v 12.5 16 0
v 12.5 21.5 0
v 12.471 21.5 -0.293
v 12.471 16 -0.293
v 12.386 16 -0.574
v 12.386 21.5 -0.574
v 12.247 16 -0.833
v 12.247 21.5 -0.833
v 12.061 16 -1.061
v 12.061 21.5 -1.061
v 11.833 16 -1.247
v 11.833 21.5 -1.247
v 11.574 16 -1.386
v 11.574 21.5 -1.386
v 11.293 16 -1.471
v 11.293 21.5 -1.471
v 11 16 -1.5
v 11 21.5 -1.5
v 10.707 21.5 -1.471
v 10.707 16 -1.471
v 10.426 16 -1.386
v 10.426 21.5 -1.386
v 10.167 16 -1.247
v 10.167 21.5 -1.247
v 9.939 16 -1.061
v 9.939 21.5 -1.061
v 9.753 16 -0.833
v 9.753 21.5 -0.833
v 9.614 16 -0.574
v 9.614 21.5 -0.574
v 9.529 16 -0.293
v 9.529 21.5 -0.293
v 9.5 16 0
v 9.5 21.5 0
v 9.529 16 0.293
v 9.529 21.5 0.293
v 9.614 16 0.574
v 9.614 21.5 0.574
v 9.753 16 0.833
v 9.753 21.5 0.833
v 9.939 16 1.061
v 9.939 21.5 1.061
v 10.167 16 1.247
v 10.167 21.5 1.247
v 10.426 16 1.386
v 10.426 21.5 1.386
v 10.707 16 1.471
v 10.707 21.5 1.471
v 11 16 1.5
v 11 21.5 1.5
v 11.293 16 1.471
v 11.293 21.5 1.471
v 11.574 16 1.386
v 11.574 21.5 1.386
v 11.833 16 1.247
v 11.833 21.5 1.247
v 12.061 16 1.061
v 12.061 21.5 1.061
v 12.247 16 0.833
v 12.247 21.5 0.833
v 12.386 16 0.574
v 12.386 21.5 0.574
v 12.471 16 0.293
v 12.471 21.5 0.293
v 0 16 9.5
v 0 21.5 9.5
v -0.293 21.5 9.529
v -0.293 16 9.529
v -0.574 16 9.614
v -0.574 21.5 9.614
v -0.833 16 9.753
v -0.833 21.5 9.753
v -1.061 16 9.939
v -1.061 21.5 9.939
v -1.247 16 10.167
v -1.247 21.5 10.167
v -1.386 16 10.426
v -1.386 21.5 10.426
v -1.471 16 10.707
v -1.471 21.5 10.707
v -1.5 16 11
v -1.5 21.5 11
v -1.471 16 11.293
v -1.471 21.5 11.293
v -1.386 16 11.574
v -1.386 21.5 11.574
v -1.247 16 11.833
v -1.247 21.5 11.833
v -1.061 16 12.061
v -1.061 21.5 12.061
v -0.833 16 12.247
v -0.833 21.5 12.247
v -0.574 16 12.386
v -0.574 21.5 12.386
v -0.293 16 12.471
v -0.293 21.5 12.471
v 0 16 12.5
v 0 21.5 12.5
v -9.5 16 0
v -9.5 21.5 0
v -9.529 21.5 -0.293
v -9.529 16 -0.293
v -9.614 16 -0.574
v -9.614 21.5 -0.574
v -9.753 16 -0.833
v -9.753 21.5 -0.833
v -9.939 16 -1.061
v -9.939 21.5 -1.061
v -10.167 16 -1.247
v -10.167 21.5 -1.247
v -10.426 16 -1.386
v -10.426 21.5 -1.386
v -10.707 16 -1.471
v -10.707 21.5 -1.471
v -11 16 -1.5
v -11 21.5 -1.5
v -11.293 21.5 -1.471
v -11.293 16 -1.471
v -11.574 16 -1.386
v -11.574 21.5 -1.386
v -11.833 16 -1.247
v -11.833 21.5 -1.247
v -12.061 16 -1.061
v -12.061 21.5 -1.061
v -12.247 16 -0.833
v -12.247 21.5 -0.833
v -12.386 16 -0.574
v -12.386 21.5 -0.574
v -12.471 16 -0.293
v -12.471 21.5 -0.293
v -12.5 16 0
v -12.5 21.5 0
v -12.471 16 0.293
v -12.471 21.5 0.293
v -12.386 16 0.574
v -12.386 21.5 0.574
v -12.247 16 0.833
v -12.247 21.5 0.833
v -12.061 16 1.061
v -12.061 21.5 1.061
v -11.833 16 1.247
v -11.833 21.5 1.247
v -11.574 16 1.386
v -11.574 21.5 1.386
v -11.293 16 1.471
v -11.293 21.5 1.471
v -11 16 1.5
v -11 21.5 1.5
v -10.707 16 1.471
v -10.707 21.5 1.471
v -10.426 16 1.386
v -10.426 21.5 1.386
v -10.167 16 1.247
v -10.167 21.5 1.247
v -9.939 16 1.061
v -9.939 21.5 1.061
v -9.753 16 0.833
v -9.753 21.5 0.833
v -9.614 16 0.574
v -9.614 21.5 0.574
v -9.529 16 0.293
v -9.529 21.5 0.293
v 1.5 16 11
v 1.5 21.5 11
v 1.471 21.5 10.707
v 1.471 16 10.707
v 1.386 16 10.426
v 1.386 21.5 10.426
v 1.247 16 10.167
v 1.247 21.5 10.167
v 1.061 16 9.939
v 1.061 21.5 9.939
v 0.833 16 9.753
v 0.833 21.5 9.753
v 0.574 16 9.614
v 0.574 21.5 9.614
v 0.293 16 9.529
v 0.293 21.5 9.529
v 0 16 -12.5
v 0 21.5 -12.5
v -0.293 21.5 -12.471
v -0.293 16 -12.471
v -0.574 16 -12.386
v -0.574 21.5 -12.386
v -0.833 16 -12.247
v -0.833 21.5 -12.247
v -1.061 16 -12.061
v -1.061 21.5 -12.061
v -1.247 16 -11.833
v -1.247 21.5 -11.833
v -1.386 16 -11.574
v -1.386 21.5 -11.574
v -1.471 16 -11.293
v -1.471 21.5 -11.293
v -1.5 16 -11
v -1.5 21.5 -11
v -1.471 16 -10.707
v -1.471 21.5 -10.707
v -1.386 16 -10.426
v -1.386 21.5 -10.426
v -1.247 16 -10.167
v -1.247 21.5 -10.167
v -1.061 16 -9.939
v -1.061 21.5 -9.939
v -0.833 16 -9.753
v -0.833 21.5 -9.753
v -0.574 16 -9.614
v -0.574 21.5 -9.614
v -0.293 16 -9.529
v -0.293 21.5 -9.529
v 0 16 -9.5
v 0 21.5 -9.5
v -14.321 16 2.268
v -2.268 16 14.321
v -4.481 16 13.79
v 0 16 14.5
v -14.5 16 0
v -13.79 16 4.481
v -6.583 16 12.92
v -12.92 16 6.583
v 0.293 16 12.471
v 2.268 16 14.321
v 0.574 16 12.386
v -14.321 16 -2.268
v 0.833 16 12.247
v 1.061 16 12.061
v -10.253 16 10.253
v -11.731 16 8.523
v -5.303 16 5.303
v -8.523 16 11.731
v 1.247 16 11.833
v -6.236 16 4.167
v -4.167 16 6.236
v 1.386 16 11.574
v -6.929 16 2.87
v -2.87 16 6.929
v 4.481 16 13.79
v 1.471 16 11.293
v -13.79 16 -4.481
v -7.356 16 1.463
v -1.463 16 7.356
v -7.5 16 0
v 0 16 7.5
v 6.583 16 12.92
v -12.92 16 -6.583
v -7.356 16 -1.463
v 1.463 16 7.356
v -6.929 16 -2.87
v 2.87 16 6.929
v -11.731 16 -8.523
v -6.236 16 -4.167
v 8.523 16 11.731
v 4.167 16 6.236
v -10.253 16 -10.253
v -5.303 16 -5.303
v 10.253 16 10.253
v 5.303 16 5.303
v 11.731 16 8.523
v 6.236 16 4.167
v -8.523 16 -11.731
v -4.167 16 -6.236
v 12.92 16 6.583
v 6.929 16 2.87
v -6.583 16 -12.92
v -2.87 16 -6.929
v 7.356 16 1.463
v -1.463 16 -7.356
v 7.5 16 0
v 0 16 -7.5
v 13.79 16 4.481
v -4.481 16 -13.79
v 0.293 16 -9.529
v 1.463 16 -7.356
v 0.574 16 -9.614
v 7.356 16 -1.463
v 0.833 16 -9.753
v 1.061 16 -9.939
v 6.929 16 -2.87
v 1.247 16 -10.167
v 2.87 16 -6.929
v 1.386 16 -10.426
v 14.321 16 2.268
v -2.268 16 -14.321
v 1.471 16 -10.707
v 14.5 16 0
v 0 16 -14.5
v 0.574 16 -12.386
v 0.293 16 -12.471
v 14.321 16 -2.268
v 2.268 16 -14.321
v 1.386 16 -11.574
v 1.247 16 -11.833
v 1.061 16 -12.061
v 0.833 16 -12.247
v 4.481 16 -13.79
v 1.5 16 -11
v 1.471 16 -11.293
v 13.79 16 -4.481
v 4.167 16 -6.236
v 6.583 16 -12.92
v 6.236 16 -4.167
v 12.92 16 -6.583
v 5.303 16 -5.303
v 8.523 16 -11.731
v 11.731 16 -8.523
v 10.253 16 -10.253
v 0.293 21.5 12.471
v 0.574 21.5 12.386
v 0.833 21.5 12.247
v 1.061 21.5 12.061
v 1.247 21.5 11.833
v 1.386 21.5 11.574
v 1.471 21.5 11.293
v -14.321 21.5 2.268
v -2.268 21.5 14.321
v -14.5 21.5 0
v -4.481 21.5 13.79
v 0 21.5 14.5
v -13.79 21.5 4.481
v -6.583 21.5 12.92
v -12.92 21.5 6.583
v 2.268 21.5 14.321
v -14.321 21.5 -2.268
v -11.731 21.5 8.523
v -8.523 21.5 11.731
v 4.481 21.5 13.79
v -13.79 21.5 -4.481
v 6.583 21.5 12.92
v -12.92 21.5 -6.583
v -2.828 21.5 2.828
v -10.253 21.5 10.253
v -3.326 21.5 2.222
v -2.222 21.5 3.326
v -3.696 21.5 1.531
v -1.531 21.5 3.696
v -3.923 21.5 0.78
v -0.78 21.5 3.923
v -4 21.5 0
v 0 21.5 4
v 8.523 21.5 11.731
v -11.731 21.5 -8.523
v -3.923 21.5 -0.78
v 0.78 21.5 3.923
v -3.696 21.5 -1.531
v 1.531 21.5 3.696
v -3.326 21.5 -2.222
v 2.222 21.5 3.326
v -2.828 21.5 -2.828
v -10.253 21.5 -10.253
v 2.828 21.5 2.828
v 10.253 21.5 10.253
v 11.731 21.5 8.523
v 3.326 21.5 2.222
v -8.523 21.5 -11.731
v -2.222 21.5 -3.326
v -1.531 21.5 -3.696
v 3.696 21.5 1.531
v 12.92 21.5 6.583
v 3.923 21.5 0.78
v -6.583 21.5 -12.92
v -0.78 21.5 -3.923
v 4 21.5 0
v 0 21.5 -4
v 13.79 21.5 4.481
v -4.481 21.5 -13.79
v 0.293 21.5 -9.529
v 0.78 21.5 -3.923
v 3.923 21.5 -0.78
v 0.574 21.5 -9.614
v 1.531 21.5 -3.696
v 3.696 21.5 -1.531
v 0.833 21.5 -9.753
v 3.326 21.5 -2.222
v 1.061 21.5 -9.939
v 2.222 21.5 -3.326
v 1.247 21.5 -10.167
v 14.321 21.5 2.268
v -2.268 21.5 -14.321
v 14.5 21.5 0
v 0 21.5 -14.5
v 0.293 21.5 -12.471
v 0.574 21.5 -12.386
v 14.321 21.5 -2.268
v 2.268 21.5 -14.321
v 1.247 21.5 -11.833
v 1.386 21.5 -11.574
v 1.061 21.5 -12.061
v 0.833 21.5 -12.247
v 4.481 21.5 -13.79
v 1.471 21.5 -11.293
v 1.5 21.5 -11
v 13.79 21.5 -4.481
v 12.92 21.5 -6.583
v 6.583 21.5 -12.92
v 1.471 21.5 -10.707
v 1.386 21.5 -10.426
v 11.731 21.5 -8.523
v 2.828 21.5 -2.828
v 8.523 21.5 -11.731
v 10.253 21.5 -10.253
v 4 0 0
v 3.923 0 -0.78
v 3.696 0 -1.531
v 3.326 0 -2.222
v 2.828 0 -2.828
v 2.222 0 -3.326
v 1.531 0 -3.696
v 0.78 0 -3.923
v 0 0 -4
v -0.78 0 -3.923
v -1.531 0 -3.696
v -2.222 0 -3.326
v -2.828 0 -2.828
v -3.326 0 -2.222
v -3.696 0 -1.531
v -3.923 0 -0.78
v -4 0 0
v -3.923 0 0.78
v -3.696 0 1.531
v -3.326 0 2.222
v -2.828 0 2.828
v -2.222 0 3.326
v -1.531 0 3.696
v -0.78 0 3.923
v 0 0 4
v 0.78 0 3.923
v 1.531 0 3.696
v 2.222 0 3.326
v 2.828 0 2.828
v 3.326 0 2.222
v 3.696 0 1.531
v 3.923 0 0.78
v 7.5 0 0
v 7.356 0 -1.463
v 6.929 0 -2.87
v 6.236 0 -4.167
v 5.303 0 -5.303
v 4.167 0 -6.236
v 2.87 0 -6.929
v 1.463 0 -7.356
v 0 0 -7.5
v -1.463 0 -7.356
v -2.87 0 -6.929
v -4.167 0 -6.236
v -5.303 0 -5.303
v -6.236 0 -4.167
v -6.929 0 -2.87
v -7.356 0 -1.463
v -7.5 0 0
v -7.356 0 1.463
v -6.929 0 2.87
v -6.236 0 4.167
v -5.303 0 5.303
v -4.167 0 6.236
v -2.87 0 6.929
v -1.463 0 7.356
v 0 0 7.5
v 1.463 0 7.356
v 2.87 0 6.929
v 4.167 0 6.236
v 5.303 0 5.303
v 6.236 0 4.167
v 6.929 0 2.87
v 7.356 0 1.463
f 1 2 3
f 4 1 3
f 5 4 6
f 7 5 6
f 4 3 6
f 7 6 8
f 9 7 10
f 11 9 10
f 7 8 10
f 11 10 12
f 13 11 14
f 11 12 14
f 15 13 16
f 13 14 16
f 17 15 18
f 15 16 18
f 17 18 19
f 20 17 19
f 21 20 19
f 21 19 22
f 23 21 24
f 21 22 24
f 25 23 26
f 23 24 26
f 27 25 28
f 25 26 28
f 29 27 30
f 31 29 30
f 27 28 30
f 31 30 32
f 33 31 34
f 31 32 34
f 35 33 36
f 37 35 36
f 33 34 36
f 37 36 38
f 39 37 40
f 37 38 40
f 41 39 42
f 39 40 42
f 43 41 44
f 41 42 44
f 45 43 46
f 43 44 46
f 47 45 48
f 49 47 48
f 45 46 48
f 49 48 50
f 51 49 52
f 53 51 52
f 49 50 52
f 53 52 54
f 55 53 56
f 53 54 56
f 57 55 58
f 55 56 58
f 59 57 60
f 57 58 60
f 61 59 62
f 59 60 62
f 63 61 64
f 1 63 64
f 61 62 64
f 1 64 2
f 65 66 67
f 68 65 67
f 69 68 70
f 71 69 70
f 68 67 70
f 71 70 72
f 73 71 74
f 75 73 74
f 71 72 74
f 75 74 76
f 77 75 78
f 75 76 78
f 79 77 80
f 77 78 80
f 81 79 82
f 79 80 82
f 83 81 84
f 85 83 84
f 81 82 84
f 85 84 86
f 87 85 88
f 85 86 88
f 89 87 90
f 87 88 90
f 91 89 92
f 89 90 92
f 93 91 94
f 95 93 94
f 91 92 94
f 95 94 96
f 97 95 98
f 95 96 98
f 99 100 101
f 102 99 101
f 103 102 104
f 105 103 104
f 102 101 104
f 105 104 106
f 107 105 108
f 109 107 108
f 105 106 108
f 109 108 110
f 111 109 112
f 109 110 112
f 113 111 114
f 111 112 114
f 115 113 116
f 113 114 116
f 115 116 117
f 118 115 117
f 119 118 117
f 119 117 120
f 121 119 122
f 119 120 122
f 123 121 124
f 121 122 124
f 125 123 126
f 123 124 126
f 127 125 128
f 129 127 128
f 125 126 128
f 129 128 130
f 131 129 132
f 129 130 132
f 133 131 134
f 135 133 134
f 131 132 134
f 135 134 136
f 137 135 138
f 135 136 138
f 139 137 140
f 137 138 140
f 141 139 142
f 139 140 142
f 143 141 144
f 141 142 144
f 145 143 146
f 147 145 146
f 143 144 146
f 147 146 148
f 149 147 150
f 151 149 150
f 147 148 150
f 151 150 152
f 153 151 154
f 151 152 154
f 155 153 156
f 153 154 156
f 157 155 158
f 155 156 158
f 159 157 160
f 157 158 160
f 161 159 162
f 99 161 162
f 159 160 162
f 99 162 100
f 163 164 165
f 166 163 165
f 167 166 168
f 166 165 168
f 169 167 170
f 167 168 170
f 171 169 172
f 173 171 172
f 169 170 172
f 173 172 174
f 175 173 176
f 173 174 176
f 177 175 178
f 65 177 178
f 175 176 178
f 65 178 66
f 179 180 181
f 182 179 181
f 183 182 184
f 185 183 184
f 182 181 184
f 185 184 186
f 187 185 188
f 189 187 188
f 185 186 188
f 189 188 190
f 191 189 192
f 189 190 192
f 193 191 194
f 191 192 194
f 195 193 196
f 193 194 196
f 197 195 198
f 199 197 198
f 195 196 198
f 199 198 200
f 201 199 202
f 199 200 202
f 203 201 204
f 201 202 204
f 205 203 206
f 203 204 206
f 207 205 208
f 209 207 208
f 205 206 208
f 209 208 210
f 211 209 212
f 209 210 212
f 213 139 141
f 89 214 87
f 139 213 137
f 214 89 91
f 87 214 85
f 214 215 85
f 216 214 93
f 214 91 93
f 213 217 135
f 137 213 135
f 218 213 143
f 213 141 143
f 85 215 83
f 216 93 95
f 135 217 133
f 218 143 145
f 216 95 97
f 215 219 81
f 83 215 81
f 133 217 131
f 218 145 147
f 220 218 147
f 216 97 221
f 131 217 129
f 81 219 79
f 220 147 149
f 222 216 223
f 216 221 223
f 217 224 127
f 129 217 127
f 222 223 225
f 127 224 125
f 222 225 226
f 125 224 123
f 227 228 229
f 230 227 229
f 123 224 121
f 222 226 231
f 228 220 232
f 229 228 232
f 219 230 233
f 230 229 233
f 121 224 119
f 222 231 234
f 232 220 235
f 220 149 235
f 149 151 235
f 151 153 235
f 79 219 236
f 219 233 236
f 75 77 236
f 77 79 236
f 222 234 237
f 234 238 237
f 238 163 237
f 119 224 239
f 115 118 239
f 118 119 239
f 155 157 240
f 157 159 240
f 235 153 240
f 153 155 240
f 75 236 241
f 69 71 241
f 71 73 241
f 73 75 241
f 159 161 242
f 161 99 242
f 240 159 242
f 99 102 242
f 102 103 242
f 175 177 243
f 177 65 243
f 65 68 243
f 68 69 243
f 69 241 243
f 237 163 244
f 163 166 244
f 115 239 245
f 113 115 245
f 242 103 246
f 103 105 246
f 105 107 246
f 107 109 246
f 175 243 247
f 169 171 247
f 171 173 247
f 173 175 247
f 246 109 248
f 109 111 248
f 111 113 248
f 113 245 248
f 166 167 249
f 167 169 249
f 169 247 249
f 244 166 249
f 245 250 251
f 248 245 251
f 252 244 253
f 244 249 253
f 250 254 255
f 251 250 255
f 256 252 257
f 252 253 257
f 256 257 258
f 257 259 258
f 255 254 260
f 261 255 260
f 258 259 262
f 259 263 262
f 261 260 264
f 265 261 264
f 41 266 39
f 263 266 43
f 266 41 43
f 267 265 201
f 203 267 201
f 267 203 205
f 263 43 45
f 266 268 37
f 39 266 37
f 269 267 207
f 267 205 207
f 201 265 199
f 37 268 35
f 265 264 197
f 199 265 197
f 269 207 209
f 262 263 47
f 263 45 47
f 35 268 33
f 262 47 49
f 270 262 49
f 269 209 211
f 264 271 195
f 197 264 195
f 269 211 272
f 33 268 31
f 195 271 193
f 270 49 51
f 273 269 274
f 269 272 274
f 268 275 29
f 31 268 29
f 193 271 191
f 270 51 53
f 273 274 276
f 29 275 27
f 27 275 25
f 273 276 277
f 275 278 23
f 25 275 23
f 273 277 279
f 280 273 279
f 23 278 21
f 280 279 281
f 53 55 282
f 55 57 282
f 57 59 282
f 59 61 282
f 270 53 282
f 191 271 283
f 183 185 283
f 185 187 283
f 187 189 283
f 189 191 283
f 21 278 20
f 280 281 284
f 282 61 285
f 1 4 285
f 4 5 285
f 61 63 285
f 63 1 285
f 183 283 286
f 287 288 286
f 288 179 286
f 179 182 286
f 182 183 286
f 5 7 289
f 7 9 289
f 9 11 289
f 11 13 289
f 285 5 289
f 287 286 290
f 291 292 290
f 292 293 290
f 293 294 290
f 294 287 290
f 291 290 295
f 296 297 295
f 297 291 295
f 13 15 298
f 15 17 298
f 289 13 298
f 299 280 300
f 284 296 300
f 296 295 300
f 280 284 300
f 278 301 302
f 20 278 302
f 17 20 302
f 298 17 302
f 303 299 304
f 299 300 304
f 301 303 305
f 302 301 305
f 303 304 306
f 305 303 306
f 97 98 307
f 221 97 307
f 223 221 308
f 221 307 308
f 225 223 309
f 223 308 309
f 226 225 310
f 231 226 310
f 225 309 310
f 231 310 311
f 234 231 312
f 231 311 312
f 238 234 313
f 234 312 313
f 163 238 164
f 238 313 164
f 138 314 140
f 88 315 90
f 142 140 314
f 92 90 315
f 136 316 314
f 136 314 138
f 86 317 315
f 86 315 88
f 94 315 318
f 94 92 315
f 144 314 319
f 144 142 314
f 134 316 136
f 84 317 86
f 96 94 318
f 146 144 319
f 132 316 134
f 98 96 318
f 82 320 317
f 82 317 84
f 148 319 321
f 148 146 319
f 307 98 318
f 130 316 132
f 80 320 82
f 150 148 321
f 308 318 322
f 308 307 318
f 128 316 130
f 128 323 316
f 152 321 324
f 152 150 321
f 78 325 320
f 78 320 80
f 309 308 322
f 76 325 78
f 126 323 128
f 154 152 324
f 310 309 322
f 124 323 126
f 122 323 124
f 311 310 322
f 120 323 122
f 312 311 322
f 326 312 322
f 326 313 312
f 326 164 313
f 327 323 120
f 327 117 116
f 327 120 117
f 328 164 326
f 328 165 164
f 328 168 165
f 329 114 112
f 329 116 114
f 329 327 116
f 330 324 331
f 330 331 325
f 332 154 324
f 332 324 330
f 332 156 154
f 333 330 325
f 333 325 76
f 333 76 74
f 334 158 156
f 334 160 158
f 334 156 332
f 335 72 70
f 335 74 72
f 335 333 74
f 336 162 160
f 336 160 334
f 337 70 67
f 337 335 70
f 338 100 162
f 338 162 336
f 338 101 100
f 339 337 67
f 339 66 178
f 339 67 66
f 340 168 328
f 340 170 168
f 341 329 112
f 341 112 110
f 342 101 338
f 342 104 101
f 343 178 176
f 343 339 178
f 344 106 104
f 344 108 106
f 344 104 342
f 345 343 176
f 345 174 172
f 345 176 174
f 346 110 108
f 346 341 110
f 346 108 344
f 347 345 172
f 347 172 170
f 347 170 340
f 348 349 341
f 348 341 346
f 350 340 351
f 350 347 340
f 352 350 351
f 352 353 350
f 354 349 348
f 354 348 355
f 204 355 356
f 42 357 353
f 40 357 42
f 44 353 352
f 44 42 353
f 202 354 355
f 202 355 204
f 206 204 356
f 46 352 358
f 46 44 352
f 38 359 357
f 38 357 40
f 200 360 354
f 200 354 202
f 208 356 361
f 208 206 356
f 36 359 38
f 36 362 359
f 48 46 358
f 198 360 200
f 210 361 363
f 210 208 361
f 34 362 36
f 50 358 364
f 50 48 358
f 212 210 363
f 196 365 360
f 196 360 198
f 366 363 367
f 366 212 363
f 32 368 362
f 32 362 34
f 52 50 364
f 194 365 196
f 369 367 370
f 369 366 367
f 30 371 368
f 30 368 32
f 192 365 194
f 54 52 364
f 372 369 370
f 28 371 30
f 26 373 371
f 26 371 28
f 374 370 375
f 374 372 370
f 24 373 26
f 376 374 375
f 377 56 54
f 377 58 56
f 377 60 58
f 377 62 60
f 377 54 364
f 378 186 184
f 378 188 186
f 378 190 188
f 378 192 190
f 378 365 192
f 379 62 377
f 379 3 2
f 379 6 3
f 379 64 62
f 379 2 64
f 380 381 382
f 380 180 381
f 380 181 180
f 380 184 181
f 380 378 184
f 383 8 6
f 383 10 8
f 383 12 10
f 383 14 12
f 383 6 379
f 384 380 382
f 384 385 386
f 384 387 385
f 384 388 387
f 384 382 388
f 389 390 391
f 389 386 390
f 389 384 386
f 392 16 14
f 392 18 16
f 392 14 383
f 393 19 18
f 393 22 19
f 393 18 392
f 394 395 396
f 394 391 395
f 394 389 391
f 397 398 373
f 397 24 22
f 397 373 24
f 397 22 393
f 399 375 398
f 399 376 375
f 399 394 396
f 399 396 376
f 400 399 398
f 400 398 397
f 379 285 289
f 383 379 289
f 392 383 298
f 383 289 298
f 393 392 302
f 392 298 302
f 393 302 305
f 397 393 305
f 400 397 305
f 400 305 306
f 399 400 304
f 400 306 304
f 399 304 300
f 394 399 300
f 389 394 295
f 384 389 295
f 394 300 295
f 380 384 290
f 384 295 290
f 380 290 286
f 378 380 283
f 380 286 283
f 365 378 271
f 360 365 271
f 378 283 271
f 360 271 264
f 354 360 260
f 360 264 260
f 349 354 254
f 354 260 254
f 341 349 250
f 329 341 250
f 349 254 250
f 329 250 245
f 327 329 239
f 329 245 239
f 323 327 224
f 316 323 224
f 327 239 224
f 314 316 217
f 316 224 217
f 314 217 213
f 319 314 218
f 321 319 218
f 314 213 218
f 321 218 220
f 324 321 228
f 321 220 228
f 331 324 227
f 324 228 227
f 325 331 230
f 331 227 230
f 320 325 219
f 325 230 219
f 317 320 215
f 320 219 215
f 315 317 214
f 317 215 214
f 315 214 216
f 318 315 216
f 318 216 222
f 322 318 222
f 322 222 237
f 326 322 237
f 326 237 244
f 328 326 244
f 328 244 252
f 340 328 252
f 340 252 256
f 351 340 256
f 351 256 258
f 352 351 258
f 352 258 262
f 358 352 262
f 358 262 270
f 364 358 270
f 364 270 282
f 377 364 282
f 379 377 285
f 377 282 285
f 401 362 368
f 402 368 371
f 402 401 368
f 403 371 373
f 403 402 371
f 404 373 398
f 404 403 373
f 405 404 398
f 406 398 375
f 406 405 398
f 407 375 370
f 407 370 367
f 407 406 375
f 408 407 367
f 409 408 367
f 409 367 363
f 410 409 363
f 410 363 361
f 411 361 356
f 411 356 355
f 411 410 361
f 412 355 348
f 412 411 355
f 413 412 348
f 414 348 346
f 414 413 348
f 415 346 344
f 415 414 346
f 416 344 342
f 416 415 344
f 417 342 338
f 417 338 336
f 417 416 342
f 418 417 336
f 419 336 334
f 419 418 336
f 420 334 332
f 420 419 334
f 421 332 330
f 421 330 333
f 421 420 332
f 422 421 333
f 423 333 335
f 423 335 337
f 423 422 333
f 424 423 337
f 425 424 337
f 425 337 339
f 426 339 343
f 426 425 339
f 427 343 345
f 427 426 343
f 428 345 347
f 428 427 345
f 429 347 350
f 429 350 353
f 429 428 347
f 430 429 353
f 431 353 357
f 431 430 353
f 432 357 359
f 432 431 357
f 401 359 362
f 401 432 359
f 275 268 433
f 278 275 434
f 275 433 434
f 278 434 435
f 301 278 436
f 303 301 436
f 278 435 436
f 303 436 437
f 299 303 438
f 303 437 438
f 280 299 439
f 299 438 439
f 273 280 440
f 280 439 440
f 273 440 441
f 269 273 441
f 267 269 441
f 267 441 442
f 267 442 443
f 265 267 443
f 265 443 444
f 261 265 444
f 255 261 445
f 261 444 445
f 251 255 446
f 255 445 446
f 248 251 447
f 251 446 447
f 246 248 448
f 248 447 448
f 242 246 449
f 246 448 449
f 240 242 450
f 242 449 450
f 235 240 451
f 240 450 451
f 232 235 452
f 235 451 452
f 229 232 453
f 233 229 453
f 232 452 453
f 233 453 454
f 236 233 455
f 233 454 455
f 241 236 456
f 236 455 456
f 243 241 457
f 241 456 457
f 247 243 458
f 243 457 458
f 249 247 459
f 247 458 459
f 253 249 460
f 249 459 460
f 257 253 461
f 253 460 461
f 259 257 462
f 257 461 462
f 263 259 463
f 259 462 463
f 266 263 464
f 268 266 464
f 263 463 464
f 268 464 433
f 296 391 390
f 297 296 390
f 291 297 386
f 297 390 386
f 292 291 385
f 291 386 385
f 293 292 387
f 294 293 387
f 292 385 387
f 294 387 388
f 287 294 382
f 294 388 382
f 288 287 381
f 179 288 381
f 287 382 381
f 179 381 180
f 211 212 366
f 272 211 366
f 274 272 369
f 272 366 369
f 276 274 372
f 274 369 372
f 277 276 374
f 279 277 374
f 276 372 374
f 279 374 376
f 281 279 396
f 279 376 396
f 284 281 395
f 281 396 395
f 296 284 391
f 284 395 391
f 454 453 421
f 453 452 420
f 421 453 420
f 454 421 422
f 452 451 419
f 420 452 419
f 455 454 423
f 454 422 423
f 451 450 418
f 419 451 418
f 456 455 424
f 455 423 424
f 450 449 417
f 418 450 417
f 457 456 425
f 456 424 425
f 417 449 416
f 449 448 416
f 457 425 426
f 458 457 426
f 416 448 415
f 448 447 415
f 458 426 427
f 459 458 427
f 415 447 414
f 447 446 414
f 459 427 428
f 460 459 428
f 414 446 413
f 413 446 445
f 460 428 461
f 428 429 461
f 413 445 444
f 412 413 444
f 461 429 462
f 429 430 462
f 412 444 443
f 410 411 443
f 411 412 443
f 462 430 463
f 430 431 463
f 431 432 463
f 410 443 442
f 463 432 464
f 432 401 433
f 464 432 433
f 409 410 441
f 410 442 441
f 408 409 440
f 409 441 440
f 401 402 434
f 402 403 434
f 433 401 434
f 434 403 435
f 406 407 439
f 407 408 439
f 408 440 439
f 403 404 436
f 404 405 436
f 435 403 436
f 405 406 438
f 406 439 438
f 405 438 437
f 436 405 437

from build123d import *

# Parameters (mm, degrees)
SKETCH1_R           = 7.5
SKETCH1_R_2         = 4
BOSS_EXTRUDE1_DEPTH = 16
SKETCH2_R           = 14.5
SKETCH2_R_2         = 7.5
BOSS_EXTRUDE2_DEPTH = 5.5
SKETCH3_R           = 7.5
SKETCH3_R_2         = 4
BOSS_EXTRUDE3_DEPTH = 5.5
SKETCH4_R           = 1.5
CUT_EXTRUDE1_DEPTH  = 5.5


with BuildPart() as part:
    # Sketch1 → Boss-Extrude1 (new body)
    with BuildSketch(Plane(origin=(0, 0, 0), x_dir=(1, 0, 0), z_dir=(0, 1, 0))):
        Circle(SKETCH1_R)
        Circle(SKETCH1_R_2, mode=Mode.SUBTRACT)
    extrude(amount=BOSS_EXTRUDE1_DEPTH)



with BuildPart() as body_2:
    # Sketch2 → Boss-Extrude2 (new body)
    with BuildSketch(Plane(origin=(0, 16, 0), x_dir=(1, 0, 0), z_dir=(0, 1, 0))):
        Circle(SKETCH2_R)
        Circle(SKETCH2_R_2, mode=Mode.SUBTRACT)
    extrude(amount=BOSS_EXTRUDE2_DEPTH)


with BuildPart() as part_1:
    add(part.part)

    add(body_2.part)  # Boss-Extrude3 merges body 2
    # Sketch3 → Boss-Extrude3 (add)
    with BuildSketch(Plane(origin=(0, 16, 0), x_dir=(1, 0, 0), z_dir=(0, 1, 0))):
        Circle(SKETCH3_R)
        Circle(SKETCH3_R_2, mode=Mode.SUBTRACT)
    extrude(amount=BOSS_EXTRUDE3_DEPTH)

    # Sketch4 → Cut-Extrude1 (cut)
    with BuildSketch(Plane(origin=(0, 21.5, 0), x_dir=(1, 0, 0), z_dir=(0, 1, 0))):
        with Locations((11, 0)):
            Circle(SKETCH4_R)
        with BuildLine():
            ThreePointArc((1.5, -11), (1.060660172, -9.939339828), (0, -9.5))
            Line((0, -9.5), (0, -12.5))
            ThreePointArc((0, -12.5), (1.060660172, -12.060660172), (1.5, -11))
        make_face()
        with BuildLine():
            Line((0, -12.5), (0, -9.5))
            ThreePointArc((0, -9.5), (-1.5, -11), (0, -12.5))
        make_face()
        with Locations((-11, 0)):
            Circle(SKETCH4_R)
        with BuildLine():
            ThreePointArc((1.5, 11), (1.060660172, 12.060660172), (0, 12.5))
            Line((0, 12.5), (0, 9.5))
            ThreePointArc((0, 9.5), (1.060660172, 9.939339828), (1.5, 11))
        make_face()
        with BuildLine():
            Line((0, 9.5), (0, 12.5))
            ThreePointArc((0, 12.5), (-1.5, 11), (0, 9.5))
        make_face()
    extrude(amount=-CUT_EXTRUDE1_DEPTH, mode=Mode.SUBTRACT)


solid = part_1.part
